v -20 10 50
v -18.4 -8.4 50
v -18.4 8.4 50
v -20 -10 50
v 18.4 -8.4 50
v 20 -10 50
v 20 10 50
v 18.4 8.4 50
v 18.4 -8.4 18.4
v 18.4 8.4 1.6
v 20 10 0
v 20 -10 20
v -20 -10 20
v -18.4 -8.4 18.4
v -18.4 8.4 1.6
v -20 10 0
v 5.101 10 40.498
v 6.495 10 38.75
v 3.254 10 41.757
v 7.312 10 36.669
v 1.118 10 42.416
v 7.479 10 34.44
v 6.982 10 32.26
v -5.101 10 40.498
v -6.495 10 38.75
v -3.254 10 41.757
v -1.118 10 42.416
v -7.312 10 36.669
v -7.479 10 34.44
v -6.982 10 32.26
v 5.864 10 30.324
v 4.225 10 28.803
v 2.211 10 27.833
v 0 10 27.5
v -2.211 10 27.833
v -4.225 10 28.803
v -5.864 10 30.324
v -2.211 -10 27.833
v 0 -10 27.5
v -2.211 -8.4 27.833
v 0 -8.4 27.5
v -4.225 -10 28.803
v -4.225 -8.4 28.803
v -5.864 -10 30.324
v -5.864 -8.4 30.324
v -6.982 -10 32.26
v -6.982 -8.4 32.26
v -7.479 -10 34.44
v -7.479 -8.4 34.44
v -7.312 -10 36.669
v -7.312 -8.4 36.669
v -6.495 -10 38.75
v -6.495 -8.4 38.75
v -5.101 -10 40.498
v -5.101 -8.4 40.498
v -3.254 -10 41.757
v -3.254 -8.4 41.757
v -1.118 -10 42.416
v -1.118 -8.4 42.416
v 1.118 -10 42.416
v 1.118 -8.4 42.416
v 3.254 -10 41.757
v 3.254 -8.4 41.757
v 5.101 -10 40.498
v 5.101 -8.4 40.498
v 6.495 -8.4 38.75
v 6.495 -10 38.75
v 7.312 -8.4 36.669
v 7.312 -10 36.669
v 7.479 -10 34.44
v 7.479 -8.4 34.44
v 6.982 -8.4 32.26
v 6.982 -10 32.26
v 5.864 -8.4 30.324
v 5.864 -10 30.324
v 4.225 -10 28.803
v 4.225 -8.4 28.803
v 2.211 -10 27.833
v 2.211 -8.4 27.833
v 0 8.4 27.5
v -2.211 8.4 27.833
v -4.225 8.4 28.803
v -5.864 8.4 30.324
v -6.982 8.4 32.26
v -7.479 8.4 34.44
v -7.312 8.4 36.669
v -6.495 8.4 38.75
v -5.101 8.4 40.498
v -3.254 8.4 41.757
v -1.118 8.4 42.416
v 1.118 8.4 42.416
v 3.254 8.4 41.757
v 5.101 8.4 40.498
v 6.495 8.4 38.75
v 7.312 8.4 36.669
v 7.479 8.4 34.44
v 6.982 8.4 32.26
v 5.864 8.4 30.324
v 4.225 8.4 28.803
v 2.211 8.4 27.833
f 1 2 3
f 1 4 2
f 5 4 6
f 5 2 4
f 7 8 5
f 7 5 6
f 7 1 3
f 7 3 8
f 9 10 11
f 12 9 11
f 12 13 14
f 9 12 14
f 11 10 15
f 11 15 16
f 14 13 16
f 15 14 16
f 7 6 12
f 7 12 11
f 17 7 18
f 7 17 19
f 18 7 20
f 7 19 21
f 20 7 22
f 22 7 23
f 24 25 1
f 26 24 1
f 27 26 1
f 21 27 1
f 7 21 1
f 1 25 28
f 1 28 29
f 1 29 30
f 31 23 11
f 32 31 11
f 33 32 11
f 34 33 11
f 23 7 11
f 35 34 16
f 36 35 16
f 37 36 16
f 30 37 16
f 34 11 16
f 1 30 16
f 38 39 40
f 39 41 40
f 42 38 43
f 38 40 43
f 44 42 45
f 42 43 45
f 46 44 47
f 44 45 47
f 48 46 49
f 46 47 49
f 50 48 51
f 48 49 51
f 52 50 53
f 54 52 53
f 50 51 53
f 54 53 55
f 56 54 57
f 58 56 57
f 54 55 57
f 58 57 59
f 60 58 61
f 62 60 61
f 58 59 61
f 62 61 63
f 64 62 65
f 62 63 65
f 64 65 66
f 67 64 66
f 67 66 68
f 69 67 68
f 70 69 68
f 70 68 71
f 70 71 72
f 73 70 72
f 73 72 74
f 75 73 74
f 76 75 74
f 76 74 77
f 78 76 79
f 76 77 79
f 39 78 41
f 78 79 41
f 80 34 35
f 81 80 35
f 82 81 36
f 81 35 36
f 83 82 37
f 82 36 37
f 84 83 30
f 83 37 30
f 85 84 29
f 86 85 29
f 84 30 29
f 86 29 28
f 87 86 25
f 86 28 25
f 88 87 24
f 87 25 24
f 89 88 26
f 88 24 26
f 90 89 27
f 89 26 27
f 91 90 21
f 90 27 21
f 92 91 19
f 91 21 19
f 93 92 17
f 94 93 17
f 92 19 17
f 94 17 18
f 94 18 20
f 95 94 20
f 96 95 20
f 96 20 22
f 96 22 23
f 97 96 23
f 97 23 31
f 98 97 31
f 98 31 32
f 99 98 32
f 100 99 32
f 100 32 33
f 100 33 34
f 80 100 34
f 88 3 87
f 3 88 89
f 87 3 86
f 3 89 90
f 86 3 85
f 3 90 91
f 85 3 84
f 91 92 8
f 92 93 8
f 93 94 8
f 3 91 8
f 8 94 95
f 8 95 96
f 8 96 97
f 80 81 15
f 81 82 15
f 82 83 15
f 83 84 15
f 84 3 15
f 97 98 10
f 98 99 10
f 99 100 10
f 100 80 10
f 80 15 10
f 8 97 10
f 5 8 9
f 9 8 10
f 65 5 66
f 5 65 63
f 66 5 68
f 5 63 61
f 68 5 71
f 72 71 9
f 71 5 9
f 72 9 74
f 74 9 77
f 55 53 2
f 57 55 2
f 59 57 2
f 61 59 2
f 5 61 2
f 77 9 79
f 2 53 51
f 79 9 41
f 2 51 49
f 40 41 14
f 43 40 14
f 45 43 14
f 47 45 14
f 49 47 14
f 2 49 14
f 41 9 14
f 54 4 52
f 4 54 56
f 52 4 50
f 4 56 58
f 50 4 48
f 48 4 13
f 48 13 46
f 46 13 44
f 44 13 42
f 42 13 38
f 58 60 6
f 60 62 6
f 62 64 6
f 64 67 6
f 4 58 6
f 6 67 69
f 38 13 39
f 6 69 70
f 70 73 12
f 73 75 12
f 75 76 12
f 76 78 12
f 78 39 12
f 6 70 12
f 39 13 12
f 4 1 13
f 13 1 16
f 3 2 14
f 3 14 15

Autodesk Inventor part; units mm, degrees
ref_plane "YZ Plane" through (0, 0, 0) normal (1, 0, 0) x (0, 1, 0)
ref_plane "XZ Plane" through (0, 0, 0) normal (0, 1, 0) x (-1, 0, 0)
ref_plane "XY Plane" through (0, 0, 0) normal (0, 0, 1) x (1, 0, 0)
sketch "スケッチ1" plane through (0, 0, 0) normal (0, 0, 1) x (1, 0, 0)
  line L0 (-20, -10) -> (20, -10)
  line L1 (20, -10) -> (20, 10)
  line L2 (20, 10) -> (-20, 10)
  line L3 (-20, 10) -> (-20, -10)
  line L4 (-20, -10) -> (20, 10) construction
  line L5 (20, -10) -> (-20, 10) construction
  line L6 (-18.4, 8.4) -> (18.4, 8.4)
  line L7 (18.4, 8.4) -> (18.4, -8.4)
  line L8 (18.4, -8.4) -> (-18.4, -8.4)
  line L9 (-18.4, -8.4) -> (-18.4, 8.4)
  point P0 (0, 0)
  dimension "d0" = 40
  dimension "d1" = 20
  dimension "d2" = 1.6
extrude "押し出し1" add sketch "スケッチ1" along normal blind 50
chamfer "面取り1" distance 20 angle 45 1 edges at (0, -10, 0)
sketch "スケッチ2" plane through (-20, -10, 50) normal (0, -1, 0) x (1, 0, 0)
  line L0 (0, 0) -> (40, 0) projected
  line L1 (40, -30) -> (40, 0) projected
  point P0 (20, -50)
  point P1 (20, -15)
  dimension "d9" = 15
  dimension "d10" = 20
hole "穴1" at (0, -10, 35) direction (0, 1, 0) diameter 15 end through all
properties part number "Pipe4"
